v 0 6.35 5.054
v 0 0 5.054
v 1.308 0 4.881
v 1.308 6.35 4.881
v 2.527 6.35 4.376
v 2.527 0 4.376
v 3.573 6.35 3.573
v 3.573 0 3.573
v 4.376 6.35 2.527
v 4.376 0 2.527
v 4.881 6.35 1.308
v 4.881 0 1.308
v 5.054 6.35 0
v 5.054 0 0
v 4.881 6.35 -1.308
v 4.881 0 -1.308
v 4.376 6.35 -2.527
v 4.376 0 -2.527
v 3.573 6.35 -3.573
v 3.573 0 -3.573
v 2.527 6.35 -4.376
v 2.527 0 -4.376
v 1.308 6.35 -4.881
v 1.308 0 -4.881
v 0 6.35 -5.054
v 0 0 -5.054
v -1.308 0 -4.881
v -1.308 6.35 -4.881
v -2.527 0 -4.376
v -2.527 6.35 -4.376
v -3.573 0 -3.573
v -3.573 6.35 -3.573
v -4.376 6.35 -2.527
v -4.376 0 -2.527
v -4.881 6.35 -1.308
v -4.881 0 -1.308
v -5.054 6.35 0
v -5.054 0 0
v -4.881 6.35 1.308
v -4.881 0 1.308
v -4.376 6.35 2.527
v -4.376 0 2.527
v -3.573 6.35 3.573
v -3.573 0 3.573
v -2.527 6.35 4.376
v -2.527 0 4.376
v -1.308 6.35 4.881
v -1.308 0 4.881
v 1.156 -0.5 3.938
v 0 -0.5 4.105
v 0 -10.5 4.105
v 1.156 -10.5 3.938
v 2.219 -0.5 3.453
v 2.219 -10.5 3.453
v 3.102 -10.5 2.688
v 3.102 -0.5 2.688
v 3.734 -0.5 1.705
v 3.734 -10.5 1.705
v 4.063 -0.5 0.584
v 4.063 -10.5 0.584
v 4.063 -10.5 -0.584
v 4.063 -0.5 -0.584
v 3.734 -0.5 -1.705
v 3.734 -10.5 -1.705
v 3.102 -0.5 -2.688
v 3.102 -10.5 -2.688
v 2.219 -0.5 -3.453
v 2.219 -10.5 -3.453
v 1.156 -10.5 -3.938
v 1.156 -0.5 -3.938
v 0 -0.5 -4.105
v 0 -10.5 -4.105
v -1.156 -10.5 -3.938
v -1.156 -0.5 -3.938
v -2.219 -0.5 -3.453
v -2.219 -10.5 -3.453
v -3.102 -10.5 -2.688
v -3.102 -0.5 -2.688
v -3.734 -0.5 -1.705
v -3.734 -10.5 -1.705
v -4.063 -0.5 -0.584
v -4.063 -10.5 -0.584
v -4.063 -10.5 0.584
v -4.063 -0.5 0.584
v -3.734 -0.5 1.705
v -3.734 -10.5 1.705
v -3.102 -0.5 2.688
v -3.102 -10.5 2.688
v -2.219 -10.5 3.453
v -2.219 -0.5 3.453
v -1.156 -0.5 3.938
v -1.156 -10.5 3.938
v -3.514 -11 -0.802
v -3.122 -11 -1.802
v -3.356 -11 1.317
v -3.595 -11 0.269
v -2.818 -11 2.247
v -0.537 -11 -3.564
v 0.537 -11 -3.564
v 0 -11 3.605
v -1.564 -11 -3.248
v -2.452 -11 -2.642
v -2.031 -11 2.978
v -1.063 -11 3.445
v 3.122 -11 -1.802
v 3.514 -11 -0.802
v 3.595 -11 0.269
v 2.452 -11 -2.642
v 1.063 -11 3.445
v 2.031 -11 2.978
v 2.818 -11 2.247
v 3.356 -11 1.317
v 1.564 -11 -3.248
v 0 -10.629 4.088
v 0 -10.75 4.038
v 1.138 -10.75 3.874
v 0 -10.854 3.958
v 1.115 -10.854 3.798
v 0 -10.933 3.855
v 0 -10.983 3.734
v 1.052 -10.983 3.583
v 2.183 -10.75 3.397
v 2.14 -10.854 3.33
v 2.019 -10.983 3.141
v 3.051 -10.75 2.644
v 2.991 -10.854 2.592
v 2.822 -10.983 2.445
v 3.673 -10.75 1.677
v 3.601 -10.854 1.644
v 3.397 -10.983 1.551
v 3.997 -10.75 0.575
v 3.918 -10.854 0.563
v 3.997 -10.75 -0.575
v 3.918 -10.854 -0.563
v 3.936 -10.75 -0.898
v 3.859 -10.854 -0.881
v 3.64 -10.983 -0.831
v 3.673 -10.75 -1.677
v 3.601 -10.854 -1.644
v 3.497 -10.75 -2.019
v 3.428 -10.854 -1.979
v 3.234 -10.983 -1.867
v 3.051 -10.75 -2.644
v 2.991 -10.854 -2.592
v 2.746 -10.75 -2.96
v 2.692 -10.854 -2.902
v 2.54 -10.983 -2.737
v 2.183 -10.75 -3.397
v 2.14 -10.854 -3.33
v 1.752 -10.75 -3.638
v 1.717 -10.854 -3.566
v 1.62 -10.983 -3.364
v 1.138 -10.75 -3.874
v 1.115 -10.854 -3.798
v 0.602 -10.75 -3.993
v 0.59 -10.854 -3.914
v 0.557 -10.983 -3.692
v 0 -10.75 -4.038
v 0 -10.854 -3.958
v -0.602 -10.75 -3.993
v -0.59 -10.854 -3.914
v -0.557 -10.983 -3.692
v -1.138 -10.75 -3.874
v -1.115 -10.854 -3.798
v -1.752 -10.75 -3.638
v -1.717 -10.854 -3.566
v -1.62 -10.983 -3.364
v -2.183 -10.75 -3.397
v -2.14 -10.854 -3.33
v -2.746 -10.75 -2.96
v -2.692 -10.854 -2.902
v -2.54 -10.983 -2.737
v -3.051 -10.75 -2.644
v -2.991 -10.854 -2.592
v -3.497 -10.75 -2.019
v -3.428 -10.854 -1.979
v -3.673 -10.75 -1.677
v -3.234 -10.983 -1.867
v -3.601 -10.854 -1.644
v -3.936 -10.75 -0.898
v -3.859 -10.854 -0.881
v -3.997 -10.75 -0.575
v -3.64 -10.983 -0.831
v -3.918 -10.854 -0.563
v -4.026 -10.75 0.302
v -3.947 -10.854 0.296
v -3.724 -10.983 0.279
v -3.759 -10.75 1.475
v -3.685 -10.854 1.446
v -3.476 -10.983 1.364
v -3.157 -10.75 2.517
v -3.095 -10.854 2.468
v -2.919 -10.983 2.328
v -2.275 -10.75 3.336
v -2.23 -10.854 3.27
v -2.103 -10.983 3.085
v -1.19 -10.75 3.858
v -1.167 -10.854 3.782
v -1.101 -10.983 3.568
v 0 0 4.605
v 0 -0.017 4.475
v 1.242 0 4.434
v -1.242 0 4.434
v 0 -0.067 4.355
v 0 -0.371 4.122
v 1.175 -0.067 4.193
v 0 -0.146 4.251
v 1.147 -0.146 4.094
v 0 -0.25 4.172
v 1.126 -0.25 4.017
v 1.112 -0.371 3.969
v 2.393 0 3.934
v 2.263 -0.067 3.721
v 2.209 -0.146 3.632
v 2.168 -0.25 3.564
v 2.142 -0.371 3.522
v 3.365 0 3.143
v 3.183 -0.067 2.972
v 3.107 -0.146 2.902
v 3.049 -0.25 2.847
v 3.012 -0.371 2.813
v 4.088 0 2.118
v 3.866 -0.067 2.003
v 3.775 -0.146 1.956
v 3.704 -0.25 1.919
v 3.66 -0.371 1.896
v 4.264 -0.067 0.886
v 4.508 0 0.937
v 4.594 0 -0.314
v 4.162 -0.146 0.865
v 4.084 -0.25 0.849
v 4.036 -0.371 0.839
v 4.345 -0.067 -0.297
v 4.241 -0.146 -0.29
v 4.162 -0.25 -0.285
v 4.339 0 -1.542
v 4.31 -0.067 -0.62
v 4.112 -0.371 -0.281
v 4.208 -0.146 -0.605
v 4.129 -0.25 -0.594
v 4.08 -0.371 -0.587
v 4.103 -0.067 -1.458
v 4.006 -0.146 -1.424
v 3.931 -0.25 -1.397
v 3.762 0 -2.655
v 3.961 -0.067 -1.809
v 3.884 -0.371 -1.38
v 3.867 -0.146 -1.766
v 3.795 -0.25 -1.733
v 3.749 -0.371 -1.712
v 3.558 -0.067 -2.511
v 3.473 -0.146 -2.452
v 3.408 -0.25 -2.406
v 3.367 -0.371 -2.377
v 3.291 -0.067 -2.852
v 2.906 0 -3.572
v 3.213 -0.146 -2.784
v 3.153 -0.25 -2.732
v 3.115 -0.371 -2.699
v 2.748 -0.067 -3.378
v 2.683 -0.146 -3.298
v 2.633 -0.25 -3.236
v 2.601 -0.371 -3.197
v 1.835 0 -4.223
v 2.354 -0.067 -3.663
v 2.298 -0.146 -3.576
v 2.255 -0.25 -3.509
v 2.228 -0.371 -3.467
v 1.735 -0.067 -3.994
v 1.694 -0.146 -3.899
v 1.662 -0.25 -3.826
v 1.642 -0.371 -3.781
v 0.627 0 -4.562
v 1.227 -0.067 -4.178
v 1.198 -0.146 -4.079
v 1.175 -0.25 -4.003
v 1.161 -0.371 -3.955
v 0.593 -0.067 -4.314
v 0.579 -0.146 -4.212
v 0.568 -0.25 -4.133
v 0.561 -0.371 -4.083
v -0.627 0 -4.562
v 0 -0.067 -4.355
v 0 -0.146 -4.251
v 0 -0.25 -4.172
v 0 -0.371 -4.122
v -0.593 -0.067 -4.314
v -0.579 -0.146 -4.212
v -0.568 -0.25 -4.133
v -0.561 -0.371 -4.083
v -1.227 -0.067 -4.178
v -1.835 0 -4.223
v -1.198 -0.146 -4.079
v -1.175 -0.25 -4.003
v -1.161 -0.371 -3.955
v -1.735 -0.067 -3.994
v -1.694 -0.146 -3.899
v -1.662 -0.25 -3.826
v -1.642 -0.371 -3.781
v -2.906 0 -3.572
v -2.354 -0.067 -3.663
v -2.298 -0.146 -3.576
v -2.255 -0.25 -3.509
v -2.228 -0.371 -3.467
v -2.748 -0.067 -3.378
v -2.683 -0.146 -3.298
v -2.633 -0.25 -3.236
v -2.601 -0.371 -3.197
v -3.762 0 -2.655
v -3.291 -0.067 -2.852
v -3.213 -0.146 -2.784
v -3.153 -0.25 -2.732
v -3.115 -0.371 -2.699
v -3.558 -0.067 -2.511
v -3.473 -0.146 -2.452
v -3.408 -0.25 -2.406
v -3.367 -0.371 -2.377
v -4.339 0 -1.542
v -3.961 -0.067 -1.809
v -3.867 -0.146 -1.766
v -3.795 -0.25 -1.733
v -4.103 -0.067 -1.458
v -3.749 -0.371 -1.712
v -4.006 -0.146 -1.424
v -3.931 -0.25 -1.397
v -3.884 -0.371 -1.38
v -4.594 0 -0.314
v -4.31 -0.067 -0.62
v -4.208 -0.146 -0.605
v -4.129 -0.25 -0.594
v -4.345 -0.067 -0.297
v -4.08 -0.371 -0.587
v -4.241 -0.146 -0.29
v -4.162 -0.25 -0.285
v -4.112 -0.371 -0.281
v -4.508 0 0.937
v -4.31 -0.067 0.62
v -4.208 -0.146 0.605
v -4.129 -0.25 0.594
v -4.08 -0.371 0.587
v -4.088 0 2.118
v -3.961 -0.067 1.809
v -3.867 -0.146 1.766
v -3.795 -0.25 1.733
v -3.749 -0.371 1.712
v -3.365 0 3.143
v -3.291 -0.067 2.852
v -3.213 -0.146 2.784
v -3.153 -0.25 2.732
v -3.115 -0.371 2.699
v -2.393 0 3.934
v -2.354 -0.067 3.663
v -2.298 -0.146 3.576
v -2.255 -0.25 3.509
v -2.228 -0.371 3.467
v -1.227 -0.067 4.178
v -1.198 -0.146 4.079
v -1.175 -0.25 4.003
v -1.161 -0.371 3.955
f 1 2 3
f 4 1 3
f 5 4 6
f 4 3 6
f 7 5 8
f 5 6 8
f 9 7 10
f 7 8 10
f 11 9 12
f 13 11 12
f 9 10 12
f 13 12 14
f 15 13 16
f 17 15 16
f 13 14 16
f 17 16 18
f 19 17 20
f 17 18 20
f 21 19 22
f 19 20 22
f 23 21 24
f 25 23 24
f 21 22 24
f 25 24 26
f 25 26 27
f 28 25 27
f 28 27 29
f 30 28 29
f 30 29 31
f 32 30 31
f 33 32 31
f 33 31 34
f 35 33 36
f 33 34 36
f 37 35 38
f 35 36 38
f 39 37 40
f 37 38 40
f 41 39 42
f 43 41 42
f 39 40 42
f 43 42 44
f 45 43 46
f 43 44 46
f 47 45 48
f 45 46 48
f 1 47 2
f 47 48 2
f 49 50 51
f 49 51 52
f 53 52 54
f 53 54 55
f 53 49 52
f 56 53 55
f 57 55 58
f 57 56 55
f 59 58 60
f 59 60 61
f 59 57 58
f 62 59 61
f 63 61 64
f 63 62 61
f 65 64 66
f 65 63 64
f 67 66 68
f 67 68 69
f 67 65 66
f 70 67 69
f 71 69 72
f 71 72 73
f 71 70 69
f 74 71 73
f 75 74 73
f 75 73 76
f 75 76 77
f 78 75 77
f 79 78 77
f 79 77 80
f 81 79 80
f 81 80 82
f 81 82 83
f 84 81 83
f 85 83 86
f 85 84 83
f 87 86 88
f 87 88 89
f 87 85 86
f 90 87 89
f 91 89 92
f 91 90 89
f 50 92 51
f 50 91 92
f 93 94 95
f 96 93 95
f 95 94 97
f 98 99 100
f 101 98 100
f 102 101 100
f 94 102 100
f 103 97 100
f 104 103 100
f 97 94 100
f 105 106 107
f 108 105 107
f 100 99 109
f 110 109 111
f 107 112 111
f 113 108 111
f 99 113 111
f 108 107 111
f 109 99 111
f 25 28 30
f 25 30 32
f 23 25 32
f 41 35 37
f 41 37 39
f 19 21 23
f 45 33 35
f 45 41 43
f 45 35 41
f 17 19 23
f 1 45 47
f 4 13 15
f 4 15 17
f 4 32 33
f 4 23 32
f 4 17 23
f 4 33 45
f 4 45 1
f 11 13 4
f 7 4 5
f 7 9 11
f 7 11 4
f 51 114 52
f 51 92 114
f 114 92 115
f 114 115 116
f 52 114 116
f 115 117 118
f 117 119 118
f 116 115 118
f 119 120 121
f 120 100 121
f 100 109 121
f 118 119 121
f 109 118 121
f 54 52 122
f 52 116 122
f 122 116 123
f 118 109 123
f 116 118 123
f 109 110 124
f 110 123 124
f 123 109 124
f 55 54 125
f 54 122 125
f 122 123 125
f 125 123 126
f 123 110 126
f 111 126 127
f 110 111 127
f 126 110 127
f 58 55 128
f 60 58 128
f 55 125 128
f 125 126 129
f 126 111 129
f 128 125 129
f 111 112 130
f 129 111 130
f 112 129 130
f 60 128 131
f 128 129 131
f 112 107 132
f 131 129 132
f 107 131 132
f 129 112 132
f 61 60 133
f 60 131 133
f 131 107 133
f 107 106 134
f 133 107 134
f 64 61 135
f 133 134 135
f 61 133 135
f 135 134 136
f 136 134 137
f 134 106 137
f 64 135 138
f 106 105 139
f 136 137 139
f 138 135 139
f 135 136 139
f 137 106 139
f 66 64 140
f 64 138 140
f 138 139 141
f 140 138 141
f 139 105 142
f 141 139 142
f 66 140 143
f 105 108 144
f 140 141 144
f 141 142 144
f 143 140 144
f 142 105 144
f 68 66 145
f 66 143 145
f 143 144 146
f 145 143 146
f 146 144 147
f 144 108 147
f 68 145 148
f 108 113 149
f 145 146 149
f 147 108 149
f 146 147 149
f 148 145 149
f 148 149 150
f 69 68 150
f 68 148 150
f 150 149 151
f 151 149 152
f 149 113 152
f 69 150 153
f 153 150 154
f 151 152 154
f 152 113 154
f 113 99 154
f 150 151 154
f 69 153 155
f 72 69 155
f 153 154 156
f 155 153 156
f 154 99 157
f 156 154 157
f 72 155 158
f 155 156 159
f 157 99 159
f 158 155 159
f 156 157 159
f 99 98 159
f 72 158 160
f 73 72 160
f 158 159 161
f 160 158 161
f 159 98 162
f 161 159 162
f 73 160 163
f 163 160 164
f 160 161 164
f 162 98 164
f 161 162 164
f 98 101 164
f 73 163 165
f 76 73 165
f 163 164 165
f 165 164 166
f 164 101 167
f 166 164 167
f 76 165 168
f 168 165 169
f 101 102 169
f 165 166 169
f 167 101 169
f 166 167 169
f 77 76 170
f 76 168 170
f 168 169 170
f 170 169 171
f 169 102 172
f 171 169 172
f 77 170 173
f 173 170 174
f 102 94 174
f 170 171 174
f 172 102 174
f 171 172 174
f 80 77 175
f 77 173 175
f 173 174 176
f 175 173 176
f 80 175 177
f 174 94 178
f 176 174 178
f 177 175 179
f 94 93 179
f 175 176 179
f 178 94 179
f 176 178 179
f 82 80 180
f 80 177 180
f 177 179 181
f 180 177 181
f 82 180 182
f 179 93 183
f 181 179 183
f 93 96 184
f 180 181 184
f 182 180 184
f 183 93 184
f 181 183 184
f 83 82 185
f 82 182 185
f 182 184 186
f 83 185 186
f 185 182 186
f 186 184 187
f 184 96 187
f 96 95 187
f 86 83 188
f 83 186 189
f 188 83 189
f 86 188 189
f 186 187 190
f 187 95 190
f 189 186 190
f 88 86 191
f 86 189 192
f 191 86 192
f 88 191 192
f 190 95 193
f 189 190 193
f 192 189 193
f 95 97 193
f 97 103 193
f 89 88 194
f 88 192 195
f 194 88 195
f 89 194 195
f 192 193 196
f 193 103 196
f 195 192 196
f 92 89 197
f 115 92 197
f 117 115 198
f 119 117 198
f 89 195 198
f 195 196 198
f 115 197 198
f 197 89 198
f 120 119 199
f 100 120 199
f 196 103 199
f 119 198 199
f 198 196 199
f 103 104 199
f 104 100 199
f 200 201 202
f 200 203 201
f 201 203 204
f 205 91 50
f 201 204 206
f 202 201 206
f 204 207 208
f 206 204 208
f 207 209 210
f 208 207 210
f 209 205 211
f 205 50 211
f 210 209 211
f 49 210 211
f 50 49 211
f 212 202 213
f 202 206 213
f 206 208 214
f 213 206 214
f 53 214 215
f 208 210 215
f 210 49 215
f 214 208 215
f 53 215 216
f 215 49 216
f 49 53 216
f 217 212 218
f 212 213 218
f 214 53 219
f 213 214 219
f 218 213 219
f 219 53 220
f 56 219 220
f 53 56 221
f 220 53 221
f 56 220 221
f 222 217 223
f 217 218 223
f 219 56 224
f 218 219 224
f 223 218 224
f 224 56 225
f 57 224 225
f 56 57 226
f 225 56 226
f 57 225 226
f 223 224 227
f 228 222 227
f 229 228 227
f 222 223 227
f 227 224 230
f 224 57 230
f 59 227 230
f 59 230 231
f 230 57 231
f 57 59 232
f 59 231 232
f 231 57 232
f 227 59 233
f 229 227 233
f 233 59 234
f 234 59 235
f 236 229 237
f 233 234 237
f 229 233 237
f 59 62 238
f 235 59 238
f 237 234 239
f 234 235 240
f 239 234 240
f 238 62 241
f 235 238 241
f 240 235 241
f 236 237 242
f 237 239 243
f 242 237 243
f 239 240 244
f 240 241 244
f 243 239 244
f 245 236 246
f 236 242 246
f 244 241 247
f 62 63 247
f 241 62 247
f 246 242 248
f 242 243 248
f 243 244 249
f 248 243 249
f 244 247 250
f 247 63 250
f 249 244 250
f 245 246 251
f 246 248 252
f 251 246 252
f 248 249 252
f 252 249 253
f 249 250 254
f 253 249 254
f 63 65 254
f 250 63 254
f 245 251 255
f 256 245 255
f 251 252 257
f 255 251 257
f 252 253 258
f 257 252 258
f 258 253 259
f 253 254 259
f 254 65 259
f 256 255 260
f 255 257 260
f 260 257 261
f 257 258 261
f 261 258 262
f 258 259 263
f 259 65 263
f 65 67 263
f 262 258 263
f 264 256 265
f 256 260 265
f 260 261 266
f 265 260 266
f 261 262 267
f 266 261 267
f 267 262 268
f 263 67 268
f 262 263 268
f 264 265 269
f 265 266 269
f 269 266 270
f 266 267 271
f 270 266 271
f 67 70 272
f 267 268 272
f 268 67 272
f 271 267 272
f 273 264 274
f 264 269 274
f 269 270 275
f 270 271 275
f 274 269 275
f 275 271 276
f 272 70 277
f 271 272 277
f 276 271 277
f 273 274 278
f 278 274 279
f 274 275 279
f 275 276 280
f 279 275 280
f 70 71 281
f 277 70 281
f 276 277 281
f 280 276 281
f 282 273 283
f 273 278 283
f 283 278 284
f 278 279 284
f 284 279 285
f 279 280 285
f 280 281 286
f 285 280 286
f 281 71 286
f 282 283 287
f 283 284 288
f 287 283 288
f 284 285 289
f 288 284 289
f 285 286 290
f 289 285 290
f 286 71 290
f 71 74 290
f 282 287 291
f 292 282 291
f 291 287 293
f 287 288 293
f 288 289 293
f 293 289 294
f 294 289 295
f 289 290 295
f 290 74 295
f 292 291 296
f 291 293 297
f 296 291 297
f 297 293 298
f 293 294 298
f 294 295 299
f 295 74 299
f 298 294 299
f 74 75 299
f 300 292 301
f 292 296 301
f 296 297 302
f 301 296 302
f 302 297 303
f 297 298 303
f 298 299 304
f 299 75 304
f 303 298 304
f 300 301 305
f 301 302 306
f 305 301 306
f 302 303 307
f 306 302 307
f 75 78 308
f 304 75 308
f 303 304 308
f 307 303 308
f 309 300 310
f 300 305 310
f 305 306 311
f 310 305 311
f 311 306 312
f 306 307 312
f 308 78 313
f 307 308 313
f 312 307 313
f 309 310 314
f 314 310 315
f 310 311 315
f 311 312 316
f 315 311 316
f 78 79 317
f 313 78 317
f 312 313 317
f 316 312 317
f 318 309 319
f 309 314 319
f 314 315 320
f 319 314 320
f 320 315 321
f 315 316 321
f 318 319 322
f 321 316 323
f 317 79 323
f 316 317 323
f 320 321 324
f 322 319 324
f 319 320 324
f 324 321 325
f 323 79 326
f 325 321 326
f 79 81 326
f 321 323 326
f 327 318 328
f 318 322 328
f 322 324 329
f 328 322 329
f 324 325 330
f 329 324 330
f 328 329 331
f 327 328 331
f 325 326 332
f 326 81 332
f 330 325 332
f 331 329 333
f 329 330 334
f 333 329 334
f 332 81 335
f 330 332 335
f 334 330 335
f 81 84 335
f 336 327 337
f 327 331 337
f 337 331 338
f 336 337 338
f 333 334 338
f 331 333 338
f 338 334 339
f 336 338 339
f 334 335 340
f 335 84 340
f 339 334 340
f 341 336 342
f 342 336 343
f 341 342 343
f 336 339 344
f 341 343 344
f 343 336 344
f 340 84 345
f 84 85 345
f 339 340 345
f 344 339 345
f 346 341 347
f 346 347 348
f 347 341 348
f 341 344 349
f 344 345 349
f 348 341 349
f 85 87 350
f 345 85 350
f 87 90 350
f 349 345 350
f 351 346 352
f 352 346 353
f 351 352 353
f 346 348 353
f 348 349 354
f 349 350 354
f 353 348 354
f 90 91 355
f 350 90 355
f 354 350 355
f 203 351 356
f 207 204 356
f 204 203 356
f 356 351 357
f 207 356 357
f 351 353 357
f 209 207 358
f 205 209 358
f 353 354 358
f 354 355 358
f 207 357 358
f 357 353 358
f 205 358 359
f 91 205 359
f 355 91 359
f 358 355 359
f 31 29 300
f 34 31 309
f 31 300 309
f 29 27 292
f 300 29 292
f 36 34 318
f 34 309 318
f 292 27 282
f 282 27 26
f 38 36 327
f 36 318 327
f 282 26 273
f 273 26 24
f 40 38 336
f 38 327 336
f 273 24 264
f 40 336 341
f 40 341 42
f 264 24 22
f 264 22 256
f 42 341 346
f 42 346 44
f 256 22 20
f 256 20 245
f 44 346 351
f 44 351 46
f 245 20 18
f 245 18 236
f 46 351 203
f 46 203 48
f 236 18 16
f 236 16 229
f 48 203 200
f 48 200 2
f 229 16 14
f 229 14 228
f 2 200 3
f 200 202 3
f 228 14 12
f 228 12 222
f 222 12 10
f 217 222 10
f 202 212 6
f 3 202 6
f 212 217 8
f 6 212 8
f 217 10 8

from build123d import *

# Parameters (mm, degrees)
SKETCH1_R           = 5.0535
BOSS_EXTRUDE1_DEPTH = 6.35
SKETCH1_3_R         = 4.1047
BOSS_EXTRUDE2_DEPTH = 11
FILLET2_R           = 0.5


with BuildPart() as part:
    # Sketch1 → Boss-Extrude1 (new body)
    with BuildSketch(Plane(origin=(0, 0, 0), x_dir=(1, 0, 0), z_dir=(0, 1, 0))):
        Circle(SKETCH1_R)
    extrude(amount=BOSS_EXTRUDE1_DEPTH)

    # Sketch1<3> → Boss-Extrude2 (add)
    with BuildSketch(Plane(origin=(0, 0, 0), x_dir=(1, 0, 0), z_dir=(0, 1, 0))):
        Circle(SKETCH1_3_R)
    extrude(amount=-BOSS_EXTRUDE2_DEPTH)

    # Fillet2
    fillet2_edges = [part.edges().sort_by_distance(p)[0] for p in [
        (-4.1047, 0, 0),
        (-4.1047, -11, 0),
    ]]
    fillet(fillet2_edges, radius=FILLET2_R)


solid = part.part
